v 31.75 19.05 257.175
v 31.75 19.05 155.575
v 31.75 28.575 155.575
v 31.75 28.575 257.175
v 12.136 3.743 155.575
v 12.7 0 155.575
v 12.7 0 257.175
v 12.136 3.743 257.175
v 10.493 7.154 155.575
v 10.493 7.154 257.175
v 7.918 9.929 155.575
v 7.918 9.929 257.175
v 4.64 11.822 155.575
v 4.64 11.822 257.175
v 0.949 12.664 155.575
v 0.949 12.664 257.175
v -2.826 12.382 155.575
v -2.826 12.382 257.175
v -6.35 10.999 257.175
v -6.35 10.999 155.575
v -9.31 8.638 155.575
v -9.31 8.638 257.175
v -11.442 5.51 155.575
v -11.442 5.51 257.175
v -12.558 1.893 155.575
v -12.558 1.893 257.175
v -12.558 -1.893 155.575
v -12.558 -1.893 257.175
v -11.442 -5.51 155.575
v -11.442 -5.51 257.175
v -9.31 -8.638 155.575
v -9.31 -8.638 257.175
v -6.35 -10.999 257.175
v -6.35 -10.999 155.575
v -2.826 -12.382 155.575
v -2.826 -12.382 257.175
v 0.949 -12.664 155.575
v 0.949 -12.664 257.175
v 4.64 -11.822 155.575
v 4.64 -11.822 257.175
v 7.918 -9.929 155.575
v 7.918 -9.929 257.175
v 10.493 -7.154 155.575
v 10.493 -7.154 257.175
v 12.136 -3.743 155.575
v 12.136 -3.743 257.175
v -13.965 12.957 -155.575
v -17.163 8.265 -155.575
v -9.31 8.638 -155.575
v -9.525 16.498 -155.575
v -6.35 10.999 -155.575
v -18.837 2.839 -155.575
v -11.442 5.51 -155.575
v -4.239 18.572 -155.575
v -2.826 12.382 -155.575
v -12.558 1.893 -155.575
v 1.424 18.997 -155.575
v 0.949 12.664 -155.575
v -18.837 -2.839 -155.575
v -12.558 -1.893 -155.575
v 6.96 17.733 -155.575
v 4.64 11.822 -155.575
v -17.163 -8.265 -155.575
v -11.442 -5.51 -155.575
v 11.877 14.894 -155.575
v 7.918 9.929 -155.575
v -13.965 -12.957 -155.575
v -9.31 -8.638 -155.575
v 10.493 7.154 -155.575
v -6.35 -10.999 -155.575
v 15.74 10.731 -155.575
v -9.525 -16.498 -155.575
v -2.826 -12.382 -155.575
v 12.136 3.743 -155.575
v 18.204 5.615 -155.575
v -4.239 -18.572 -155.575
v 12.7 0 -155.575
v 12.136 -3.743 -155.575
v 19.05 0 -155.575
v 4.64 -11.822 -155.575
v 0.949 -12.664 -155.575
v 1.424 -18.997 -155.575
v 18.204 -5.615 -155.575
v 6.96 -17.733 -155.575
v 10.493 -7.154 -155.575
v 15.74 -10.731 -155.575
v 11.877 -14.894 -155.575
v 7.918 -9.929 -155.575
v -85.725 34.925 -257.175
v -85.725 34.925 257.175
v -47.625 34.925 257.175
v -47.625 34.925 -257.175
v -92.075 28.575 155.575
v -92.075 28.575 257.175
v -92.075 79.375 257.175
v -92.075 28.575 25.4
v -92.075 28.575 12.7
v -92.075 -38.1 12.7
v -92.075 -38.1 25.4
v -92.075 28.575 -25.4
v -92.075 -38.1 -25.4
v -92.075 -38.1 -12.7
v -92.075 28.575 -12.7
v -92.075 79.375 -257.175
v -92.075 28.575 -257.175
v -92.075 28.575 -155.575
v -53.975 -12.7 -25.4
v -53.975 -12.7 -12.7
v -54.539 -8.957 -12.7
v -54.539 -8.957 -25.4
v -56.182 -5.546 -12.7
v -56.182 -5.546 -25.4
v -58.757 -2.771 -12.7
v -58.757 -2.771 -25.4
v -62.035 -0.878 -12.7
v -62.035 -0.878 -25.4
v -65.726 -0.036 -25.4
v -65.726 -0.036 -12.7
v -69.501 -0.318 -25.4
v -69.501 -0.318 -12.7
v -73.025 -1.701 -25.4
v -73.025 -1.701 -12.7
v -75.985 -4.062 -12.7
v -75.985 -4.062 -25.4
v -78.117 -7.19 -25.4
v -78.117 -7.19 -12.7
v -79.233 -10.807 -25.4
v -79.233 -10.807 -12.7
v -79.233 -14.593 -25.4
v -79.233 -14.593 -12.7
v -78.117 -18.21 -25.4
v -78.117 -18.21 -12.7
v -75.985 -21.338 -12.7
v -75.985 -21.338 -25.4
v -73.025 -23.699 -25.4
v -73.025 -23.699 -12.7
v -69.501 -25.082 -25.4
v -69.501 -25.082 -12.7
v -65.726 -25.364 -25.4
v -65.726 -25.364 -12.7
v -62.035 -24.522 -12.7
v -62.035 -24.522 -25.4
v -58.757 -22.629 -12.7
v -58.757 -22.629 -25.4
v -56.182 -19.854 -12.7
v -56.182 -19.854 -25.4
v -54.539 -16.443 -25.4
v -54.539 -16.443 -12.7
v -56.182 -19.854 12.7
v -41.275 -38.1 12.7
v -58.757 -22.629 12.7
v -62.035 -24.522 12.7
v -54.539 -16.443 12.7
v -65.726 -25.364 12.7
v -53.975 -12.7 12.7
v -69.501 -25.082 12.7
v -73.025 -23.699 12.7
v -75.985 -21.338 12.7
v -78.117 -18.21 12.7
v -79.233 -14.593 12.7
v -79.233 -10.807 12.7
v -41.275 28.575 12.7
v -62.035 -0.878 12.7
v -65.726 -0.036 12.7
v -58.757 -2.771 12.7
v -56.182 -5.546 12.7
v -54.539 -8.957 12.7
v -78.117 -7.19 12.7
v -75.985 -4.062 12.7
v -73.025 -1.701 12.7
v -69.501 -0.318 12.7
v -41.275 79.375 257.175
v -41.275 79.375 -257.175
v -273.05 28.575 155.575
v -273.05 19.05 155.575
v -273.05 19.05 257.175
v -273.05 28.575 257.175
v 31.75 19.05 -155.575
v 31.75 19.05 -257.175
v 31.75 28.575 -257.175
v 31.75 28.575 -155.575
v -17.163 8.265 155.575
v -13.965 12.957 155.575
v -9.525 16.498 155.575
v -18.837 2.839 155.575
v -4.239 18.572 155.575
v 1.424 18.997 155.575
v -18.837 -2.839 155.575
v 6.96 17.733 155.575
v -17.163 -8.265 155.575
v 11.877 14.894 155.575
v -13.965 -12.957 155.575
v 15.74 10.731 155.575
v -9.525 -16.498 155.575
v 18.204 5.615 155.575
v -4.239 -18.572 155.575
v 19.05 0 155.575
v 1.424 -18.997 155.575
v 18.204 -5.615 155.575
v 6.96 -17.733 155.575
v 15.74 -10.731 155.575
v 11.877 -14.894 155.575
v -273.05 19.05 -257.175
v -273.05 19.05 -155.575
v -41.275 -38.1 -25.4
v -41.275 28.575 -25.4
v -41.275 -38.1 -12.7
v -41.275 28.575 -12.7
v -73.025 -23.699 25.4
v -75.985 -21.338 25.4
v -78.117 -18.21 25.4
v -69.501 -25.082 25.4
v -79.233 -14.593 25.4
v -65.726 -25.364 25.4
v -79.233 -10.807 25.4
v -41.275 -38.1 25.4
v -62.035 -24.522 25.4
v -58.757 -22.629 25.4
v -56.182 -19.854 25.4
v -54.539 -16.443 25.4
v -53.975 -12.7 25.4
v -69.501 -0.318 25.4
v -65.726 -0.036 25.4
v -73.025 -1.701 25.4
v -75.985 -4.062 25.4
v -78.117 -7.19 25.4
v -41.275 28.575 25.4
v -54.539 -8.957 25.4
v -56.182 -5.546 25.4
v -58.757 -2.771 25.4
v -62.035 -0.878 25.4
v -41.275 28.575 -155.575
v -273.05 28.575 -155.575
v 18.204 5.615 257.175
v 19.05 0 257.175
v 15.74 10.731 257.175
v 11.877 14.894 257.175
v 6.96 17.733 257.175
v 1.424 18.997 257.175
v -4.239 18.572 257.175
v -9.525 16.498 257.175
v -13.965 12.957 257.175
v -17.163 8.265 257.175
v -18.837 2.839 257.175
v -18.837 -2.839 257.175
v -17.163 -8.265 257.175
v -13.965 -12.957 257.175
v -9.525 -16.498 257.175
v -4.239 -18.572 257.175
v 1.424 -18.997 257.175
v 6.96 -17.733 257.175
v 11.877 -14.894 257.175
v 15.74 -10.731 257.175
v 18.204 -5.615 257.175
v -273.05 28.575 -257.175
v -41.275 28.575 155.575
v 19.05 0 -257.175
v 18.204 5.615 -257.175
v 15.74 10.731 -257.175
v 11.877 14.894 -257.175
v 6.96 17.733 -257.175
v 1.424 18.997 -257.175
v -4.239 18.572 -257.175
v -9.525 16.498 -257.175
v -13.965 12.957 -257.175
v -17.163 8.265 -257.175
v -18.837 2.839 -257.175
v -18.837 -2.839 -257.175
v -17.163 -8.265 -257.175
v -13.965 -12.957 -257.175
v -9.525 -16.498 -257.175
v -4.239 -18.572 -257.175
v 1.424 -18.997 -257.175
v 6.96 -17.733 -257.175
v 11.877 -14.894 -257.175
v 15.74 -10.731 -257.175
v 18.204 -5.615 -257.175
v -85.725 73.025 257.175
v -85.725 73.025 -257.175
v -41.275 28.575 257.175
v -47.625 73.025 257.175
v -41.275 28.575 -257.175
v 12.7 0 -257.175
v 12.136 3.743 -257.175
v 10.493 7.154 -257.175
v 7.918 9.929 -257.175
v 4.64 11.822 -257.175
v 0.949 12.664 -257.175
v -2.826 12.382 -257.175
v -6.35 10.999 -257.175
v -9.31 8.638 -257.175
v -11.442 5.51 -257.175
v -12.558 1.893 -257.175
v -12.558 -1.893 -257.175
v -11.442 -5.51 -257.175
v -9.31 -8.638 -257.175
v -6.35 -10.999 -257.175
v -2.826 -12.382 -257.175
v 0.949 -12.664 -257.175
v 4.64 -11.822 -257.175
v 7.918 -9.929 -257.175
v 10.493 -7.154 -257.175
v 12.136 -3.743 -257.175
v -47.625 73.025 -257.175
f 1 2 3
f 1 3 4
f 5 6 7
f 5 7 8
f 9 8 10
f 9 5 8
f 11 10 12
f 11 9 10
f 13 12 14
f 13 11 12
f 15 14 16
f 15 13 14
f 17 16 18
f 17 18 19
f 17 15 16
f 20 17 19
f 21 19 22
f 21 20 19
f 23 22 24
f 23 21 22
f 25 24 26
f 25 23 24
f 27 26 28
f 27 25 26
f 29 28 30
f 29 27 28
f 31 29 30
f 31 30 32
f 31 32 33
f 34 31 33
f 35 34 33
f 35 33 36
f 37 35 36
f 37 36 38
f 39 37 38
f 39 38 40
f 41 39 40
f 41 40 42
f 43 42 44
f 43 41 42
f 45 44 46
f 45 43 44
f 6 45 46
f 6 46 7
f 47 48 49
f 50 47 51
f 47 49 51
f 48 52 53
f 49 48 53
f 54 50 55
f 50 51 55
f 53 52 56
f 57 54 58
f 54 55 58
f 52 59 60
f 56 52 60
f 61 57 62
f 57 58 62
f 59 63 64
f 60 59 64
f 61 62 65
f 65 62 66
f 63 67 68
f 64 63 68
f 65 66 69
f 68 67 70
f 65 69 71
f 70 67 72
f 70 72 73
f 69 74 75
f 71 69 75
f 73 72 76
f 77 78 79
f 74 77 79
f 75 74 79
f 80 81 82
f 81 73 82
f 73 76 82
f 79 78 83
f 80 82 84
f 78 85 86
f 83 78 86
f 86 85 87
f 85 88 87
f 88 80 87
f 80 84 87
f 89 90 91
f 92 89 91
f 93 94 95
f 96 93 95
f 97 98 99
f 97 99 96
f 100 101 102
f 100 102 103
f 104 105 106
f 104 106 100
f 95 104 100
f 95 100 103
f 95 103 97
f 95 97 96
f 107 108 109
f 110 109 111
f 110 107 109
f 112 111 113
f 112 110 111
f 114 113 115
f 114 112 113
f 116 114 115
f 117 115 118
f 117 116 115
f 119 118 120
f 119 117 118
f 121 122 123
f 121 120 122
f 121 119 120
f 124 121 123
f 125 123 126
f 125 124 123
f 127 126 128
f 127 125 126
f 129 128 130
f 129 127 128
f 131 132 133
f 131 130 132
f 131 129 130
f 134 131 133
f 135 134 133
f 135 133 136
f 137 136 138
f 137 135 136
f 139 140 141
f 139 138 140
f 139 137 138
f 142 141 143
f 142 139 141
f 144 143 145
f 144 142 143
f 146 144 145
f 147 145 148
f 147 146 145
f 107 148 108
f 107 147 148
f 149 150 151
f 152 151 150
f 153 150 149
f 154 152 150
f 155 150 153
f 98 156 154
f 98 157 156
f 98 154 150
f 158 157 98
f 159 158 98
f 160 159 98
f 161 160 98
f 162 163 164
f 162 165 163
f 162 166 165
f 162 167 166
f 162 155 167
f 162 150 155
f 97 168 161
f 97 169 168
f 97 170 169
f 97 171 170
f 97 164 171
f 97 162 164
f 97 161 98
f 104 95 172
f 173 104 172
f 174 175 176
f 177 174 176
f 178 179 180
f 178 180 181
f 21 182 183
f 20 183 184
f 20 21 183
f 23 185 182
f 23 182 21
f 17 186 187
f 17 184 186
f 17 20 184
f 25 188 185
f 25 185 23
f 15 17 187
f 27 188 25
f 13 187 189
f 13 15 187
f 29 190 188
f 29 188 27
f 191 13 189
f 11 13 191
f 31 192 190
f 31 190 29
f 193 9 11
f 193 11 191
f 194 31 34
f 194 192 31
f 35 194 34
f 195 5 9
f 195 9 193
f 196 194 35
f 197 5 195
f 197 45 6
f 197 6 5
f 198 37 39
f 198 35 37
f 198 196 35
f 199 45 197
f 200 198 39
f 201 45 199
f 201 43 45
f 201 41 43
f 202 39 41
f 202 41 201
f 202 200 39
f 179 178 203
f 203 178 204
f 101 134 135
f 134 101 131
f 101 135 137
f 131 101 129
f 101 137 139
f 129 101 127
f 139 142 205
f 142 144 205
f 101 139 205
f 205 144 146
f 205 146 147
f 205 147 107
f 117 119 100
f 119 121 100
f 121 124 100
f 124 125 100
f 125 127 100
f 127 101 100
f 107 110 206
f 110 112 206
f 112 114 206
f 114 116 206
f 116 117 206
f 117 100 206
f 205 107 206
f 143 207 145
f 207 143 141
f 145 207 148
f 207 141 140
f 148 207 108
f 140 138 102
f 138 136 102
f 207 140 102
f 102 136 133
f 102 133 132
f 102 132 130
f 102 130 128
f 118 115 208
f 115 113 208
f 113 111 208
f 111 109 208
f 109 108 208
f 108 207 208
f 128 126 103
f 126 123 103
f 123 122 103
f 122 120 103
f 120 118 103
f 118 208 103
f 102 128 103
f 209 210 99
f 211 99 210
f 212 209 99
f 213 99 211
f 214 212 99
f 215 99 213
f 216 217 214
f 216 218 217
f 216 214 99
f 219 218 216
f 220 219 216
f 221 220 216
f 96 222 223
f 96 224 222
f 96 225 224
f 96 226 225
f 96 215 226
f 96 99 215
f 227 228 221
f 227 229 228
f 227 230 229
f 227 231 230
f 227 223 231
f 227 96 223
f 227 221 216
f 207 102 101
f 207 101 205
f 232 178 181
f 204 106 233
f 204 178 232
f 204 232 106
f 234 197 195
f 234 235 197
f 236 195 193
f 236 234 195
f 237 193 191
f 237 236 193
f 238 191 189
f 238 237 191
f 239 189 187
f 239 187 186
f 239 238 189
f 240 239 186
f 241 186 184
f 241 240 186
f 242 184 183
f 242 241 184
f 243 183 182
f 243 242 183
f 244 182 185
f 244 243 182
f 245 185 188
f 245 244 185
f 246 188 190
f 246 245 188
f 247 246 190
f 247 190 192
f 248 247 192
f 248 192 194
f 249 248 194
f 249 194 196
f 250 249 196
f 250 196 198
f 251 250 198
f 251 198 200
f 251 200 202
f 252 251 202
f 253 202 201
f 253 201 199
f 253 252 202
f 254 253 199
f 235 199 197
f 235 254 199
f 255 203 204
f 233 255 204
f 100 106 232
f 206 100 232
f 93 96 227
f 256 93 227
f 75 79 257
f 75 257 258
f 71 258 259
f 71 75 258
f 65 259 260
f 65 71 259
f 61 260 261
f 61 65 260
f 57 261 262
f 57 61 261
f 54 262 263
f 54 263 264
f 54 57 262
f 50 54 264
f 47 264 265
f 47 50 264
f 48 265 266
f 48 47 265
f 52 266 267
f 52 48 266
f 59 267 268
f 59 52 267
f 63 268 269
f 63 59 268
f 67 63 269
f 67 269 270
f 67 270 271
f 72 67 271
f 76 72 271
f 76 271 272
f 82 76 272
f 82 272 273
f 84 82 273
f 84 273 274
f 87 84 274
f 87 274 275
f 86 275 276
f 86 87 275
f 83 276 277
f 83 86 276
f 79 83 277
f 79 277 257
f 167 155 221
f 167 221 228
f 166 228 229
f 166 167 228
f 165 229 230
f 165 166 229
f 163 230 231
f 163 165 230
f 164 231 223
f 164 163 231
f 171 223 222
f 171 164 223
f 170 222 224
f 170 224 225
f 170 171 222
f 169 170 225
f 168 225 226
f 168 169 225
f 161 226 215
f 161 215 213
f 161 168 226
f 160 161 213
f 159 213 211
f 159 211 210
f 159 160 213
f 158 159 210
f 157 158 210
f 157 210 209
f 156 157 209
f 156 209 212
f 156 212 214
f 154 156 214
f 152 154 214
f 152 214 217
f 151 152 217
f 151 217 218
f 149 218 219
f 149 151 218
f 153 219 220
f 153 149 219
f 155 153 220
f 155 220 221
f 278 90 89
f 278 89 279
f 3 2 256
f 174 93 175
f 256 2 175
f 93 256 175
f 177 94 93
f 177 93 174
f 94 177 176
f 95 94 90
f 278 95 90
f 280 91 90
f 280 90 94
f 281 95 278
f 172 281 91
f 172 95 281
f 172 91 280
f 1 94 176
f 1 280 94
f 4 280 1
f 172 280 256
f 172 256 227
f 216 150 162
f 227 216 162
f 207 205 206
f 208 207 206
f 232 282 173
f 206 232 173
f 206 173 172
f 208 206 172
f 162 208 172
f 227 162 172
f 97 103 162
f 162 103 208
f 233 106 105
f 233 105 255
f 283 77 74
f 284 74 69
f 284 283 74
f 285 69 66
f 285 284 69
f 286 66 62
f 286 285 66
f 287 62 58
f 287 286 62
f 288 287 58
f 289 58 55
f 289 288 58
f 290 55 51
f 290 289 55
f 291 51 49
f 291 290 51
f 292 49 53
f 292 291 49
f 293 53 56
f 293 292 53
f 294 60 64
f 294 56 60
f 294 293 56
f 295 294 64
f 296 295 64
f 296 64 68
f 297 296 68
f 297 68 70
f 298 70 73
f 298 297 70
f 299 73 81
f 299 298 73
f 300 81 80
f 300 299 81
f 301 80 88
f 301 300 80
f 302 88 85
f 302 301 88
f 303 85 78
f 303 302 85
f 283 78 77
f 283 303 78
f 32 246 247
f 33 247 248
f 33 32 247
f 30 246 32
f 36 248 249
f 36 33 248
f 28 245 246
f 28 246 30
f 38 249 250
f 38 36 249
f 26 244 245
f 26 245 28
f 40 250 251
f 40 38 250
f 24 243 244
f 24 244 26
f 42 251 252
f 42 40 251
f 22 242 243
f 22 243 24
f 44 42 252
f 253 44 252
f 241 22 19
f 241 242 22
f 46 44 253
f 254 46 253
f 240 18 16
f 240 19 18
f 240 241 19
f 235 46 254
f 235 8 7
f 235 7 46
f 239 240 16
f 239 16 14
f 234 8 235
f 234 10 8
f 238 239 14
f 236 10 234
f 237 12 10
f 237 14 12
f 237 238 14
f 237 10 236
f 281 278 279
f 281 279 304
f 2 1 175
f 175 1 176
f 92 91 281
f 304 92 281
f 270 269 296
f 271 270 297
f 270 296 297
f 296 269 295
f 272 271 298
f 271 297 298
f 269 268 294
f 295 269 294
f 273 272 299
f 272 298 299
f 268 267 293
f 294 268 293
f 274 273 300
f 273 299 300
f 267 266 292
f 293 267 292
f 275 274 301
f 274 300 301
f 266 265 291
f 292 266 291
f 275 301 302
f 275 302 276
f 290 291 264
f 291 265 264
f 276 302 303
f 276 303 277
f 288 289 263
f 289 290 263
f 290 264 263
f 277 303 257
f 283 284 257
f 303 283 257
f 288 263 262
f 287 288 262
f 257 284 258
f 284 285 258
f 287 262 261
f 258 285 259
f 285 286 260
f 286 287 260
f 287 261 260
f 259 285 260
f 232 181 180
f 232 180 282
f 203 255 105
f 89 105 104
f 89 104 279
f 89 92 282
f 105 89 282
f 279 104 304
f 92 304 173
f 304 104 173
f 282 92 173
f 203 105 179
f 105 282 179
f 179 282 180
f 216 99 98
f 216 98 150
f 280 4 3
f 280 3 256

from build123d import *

# Parameters (mm, degrees)
SKETCH1_R               = 19.05
SKETCH1_R_2             = 12.7
EXTRUDE1_DEPTH          = 257.175
SKETCH2_W               = 304.8
SKETCH2_H               = 101.6
EXTRUDE2_DEPTH          = 9.525
EXTRUDE2_2_DEPTH        = 9.525
SKETCH3_W               = 50.8
SKETCH3_H               = 66.675
SKETCH3_R               = 12.7
EXTRUDE3_DEPTH          = 25.4
SKETCH4_W               = 50.8
SKETCH4_H               = 25.4
CUT_EXTRUDE1_DEPTH      = 66.675
CUT_EXTRUDE2_DEPTH      = 378.023730188
CUT_EXTRUDE2_DEPTH_BACK = 378.023730188
SKETCH5_W               = 38.1
SKETCH5_H               = 311.15
EXTRUDE4_START          = -257.175
SKETCH7_W               = 50.8
SKETCH7_H               = 50.8
SKETCH7_W_2             = 38.1
SKETCH7_H_2             = 38.1
EXTRUDE4_DEPTH          = 514.35


with BuildPart() as part:
    # Sketch1 → Extrude1 (new, symmetric)
    with BuildSketch(Plane.XY):
        Circle(SKETCH1_R)
        Circle(SKETCH1_R_2, mode=Mode.SUBTRACT)
    extrude(amount=EXTRUDE1_DEPTH, both=True)

    # Sketch5 → Cut-Extrude2 (cut, two sides: drawn at the far end of the back side and taken through both)
    with BuildSketch(Plane(origin=(0, 0, 0), x_dir=(1, 0, 0), z_dir=(0, 1, 0)).offset(-CUT_EXTRUDE2_DEPTH_BACK)):
        Rectangle(SKETCH5_W, SKETCH5_H)
    extrude(amount=CUT_EXTRUDE2_DEPTH + CUT_EXTRUDE2_DEPTH_BACK, mode=Mode.SUBTRACT)


with BuildPart() as body_2:
    # Sketch2 → Extrude2 (new body)
    with BuildSketch(Plane(origin=(0, 19.05, 0), x_dir=(-1, 0, 0), z_dir=(0, 1, 0))):
        with Locations((120.65, 206.375)):
            Rectangle(SKETCH2_W, SKETCH2_H)
    extrude(amount=EXTRUDE2_DEPTH)



with BuildPart() as body_3:
    # Sketch2 → Extrude2 2 (new body)
    with BuildSketch(Plane(origin=(0, 19.05, 0), x_dir=(-1, 0, 0), z_dir=(0, 1, 0))):
        with Locations((120.65, -206.375)):
            Rectangle(SKETCH2_W, SKETCH2_H)
    extrude(amount=EXTRUDE2_2_DEPTH)


with BuildPart() as body_4:
    # Sketch3 → Extrude3 (new, symmetric)
    with BuildSketch(Plane.XY):
        with Locations((-66.675, -4.7625)):
            Rectangle(SKETCH3_W, SKETCH3_H)
        with Locations((-66.675, -12.7)):
            Circle(SKETCH3_R, mode=Mode.SUBTRACT)
    extrude(amount=EXTRUDE3_DEPTH, both=True)

    # Sketch4 → Cut-Extrude1 (cut)
    with BuildSketch(Plane(origin=(0, 28.575, 0), x_dir=(-1, 0, 0), z_dir=(0, 1, 0))):
        with Locations((66.675, 0)):
            Rectangle(SKETCH4_W, SKETCH4_H)
    extrude(amount=-CUT_EXTRUDE1_DEPTH, mode=Mode.SUBTRACT)


with BuildPart() as cut_extrude1_piece_1:
    # of the separate pieces the step leaves, piece 1, a body of its own (cut_extrude1_pieces)
    add(body_4.part.solids().sort_by_distance((-92.075, 28.575, 25.4))[0])


with BuildPart() as cut_extrude1_piece_2:
    # of the separate pieces the step leaves, piece 2, a body of its own (cut_extrude1_pieces)
    add(body_4.part.solids().sort_by_distance((-92.075, 28.575, -12.7))[0])


with BuildPart() as cut_extrude2_piece_1:
    # of the separate pieces the step leaves, piece 1, a body of its own (cut_extrude2_pieces)
    add(part.part.solids().sort_by_distance((19.05, 0, 155.575))[0])


with BuildPart() as cut_extrude2_piece_2:
    # of the separate pieces the step leaves, piece 2, a body of its own (cut_extrude2_pieces)
    add(part.part.solids().sort_by_distance((19.05, 0, -257.175))[0])


with BuildPart() as body_2_1:
    add(body_2.part)

    add(body_3.part)  # Extrude4 merges body 3

    add(cut_extrude1_piece_1.part)  # Extrude4 merges Cut-Extrude1 piece 1

    add(cut_extrude1_piece_2.part)  # Extrude4 merges Cut-Extrude1 piece 2
    # Sketch7 → Extrude4 (add)
    with BuildSketch(Plane.XY.offset(EXTRUDE4_START)):
        with Locations((-66.675, 53.975)):
            Rectangle(SKETCH7_W, SKETCH7_H)
        with Locations((-66.675, 53.975)):
            Rectangle(SKETCH7_W_2, SKETCH7_H_2, mode=Mode.SUBTRACT)
    extrude(amount=EXTRUDE4_DEPTH)


solid = Compound([cut_extrude2_piece_1.part, cut_extrude2_piece_2.part, body_2_1.part])
